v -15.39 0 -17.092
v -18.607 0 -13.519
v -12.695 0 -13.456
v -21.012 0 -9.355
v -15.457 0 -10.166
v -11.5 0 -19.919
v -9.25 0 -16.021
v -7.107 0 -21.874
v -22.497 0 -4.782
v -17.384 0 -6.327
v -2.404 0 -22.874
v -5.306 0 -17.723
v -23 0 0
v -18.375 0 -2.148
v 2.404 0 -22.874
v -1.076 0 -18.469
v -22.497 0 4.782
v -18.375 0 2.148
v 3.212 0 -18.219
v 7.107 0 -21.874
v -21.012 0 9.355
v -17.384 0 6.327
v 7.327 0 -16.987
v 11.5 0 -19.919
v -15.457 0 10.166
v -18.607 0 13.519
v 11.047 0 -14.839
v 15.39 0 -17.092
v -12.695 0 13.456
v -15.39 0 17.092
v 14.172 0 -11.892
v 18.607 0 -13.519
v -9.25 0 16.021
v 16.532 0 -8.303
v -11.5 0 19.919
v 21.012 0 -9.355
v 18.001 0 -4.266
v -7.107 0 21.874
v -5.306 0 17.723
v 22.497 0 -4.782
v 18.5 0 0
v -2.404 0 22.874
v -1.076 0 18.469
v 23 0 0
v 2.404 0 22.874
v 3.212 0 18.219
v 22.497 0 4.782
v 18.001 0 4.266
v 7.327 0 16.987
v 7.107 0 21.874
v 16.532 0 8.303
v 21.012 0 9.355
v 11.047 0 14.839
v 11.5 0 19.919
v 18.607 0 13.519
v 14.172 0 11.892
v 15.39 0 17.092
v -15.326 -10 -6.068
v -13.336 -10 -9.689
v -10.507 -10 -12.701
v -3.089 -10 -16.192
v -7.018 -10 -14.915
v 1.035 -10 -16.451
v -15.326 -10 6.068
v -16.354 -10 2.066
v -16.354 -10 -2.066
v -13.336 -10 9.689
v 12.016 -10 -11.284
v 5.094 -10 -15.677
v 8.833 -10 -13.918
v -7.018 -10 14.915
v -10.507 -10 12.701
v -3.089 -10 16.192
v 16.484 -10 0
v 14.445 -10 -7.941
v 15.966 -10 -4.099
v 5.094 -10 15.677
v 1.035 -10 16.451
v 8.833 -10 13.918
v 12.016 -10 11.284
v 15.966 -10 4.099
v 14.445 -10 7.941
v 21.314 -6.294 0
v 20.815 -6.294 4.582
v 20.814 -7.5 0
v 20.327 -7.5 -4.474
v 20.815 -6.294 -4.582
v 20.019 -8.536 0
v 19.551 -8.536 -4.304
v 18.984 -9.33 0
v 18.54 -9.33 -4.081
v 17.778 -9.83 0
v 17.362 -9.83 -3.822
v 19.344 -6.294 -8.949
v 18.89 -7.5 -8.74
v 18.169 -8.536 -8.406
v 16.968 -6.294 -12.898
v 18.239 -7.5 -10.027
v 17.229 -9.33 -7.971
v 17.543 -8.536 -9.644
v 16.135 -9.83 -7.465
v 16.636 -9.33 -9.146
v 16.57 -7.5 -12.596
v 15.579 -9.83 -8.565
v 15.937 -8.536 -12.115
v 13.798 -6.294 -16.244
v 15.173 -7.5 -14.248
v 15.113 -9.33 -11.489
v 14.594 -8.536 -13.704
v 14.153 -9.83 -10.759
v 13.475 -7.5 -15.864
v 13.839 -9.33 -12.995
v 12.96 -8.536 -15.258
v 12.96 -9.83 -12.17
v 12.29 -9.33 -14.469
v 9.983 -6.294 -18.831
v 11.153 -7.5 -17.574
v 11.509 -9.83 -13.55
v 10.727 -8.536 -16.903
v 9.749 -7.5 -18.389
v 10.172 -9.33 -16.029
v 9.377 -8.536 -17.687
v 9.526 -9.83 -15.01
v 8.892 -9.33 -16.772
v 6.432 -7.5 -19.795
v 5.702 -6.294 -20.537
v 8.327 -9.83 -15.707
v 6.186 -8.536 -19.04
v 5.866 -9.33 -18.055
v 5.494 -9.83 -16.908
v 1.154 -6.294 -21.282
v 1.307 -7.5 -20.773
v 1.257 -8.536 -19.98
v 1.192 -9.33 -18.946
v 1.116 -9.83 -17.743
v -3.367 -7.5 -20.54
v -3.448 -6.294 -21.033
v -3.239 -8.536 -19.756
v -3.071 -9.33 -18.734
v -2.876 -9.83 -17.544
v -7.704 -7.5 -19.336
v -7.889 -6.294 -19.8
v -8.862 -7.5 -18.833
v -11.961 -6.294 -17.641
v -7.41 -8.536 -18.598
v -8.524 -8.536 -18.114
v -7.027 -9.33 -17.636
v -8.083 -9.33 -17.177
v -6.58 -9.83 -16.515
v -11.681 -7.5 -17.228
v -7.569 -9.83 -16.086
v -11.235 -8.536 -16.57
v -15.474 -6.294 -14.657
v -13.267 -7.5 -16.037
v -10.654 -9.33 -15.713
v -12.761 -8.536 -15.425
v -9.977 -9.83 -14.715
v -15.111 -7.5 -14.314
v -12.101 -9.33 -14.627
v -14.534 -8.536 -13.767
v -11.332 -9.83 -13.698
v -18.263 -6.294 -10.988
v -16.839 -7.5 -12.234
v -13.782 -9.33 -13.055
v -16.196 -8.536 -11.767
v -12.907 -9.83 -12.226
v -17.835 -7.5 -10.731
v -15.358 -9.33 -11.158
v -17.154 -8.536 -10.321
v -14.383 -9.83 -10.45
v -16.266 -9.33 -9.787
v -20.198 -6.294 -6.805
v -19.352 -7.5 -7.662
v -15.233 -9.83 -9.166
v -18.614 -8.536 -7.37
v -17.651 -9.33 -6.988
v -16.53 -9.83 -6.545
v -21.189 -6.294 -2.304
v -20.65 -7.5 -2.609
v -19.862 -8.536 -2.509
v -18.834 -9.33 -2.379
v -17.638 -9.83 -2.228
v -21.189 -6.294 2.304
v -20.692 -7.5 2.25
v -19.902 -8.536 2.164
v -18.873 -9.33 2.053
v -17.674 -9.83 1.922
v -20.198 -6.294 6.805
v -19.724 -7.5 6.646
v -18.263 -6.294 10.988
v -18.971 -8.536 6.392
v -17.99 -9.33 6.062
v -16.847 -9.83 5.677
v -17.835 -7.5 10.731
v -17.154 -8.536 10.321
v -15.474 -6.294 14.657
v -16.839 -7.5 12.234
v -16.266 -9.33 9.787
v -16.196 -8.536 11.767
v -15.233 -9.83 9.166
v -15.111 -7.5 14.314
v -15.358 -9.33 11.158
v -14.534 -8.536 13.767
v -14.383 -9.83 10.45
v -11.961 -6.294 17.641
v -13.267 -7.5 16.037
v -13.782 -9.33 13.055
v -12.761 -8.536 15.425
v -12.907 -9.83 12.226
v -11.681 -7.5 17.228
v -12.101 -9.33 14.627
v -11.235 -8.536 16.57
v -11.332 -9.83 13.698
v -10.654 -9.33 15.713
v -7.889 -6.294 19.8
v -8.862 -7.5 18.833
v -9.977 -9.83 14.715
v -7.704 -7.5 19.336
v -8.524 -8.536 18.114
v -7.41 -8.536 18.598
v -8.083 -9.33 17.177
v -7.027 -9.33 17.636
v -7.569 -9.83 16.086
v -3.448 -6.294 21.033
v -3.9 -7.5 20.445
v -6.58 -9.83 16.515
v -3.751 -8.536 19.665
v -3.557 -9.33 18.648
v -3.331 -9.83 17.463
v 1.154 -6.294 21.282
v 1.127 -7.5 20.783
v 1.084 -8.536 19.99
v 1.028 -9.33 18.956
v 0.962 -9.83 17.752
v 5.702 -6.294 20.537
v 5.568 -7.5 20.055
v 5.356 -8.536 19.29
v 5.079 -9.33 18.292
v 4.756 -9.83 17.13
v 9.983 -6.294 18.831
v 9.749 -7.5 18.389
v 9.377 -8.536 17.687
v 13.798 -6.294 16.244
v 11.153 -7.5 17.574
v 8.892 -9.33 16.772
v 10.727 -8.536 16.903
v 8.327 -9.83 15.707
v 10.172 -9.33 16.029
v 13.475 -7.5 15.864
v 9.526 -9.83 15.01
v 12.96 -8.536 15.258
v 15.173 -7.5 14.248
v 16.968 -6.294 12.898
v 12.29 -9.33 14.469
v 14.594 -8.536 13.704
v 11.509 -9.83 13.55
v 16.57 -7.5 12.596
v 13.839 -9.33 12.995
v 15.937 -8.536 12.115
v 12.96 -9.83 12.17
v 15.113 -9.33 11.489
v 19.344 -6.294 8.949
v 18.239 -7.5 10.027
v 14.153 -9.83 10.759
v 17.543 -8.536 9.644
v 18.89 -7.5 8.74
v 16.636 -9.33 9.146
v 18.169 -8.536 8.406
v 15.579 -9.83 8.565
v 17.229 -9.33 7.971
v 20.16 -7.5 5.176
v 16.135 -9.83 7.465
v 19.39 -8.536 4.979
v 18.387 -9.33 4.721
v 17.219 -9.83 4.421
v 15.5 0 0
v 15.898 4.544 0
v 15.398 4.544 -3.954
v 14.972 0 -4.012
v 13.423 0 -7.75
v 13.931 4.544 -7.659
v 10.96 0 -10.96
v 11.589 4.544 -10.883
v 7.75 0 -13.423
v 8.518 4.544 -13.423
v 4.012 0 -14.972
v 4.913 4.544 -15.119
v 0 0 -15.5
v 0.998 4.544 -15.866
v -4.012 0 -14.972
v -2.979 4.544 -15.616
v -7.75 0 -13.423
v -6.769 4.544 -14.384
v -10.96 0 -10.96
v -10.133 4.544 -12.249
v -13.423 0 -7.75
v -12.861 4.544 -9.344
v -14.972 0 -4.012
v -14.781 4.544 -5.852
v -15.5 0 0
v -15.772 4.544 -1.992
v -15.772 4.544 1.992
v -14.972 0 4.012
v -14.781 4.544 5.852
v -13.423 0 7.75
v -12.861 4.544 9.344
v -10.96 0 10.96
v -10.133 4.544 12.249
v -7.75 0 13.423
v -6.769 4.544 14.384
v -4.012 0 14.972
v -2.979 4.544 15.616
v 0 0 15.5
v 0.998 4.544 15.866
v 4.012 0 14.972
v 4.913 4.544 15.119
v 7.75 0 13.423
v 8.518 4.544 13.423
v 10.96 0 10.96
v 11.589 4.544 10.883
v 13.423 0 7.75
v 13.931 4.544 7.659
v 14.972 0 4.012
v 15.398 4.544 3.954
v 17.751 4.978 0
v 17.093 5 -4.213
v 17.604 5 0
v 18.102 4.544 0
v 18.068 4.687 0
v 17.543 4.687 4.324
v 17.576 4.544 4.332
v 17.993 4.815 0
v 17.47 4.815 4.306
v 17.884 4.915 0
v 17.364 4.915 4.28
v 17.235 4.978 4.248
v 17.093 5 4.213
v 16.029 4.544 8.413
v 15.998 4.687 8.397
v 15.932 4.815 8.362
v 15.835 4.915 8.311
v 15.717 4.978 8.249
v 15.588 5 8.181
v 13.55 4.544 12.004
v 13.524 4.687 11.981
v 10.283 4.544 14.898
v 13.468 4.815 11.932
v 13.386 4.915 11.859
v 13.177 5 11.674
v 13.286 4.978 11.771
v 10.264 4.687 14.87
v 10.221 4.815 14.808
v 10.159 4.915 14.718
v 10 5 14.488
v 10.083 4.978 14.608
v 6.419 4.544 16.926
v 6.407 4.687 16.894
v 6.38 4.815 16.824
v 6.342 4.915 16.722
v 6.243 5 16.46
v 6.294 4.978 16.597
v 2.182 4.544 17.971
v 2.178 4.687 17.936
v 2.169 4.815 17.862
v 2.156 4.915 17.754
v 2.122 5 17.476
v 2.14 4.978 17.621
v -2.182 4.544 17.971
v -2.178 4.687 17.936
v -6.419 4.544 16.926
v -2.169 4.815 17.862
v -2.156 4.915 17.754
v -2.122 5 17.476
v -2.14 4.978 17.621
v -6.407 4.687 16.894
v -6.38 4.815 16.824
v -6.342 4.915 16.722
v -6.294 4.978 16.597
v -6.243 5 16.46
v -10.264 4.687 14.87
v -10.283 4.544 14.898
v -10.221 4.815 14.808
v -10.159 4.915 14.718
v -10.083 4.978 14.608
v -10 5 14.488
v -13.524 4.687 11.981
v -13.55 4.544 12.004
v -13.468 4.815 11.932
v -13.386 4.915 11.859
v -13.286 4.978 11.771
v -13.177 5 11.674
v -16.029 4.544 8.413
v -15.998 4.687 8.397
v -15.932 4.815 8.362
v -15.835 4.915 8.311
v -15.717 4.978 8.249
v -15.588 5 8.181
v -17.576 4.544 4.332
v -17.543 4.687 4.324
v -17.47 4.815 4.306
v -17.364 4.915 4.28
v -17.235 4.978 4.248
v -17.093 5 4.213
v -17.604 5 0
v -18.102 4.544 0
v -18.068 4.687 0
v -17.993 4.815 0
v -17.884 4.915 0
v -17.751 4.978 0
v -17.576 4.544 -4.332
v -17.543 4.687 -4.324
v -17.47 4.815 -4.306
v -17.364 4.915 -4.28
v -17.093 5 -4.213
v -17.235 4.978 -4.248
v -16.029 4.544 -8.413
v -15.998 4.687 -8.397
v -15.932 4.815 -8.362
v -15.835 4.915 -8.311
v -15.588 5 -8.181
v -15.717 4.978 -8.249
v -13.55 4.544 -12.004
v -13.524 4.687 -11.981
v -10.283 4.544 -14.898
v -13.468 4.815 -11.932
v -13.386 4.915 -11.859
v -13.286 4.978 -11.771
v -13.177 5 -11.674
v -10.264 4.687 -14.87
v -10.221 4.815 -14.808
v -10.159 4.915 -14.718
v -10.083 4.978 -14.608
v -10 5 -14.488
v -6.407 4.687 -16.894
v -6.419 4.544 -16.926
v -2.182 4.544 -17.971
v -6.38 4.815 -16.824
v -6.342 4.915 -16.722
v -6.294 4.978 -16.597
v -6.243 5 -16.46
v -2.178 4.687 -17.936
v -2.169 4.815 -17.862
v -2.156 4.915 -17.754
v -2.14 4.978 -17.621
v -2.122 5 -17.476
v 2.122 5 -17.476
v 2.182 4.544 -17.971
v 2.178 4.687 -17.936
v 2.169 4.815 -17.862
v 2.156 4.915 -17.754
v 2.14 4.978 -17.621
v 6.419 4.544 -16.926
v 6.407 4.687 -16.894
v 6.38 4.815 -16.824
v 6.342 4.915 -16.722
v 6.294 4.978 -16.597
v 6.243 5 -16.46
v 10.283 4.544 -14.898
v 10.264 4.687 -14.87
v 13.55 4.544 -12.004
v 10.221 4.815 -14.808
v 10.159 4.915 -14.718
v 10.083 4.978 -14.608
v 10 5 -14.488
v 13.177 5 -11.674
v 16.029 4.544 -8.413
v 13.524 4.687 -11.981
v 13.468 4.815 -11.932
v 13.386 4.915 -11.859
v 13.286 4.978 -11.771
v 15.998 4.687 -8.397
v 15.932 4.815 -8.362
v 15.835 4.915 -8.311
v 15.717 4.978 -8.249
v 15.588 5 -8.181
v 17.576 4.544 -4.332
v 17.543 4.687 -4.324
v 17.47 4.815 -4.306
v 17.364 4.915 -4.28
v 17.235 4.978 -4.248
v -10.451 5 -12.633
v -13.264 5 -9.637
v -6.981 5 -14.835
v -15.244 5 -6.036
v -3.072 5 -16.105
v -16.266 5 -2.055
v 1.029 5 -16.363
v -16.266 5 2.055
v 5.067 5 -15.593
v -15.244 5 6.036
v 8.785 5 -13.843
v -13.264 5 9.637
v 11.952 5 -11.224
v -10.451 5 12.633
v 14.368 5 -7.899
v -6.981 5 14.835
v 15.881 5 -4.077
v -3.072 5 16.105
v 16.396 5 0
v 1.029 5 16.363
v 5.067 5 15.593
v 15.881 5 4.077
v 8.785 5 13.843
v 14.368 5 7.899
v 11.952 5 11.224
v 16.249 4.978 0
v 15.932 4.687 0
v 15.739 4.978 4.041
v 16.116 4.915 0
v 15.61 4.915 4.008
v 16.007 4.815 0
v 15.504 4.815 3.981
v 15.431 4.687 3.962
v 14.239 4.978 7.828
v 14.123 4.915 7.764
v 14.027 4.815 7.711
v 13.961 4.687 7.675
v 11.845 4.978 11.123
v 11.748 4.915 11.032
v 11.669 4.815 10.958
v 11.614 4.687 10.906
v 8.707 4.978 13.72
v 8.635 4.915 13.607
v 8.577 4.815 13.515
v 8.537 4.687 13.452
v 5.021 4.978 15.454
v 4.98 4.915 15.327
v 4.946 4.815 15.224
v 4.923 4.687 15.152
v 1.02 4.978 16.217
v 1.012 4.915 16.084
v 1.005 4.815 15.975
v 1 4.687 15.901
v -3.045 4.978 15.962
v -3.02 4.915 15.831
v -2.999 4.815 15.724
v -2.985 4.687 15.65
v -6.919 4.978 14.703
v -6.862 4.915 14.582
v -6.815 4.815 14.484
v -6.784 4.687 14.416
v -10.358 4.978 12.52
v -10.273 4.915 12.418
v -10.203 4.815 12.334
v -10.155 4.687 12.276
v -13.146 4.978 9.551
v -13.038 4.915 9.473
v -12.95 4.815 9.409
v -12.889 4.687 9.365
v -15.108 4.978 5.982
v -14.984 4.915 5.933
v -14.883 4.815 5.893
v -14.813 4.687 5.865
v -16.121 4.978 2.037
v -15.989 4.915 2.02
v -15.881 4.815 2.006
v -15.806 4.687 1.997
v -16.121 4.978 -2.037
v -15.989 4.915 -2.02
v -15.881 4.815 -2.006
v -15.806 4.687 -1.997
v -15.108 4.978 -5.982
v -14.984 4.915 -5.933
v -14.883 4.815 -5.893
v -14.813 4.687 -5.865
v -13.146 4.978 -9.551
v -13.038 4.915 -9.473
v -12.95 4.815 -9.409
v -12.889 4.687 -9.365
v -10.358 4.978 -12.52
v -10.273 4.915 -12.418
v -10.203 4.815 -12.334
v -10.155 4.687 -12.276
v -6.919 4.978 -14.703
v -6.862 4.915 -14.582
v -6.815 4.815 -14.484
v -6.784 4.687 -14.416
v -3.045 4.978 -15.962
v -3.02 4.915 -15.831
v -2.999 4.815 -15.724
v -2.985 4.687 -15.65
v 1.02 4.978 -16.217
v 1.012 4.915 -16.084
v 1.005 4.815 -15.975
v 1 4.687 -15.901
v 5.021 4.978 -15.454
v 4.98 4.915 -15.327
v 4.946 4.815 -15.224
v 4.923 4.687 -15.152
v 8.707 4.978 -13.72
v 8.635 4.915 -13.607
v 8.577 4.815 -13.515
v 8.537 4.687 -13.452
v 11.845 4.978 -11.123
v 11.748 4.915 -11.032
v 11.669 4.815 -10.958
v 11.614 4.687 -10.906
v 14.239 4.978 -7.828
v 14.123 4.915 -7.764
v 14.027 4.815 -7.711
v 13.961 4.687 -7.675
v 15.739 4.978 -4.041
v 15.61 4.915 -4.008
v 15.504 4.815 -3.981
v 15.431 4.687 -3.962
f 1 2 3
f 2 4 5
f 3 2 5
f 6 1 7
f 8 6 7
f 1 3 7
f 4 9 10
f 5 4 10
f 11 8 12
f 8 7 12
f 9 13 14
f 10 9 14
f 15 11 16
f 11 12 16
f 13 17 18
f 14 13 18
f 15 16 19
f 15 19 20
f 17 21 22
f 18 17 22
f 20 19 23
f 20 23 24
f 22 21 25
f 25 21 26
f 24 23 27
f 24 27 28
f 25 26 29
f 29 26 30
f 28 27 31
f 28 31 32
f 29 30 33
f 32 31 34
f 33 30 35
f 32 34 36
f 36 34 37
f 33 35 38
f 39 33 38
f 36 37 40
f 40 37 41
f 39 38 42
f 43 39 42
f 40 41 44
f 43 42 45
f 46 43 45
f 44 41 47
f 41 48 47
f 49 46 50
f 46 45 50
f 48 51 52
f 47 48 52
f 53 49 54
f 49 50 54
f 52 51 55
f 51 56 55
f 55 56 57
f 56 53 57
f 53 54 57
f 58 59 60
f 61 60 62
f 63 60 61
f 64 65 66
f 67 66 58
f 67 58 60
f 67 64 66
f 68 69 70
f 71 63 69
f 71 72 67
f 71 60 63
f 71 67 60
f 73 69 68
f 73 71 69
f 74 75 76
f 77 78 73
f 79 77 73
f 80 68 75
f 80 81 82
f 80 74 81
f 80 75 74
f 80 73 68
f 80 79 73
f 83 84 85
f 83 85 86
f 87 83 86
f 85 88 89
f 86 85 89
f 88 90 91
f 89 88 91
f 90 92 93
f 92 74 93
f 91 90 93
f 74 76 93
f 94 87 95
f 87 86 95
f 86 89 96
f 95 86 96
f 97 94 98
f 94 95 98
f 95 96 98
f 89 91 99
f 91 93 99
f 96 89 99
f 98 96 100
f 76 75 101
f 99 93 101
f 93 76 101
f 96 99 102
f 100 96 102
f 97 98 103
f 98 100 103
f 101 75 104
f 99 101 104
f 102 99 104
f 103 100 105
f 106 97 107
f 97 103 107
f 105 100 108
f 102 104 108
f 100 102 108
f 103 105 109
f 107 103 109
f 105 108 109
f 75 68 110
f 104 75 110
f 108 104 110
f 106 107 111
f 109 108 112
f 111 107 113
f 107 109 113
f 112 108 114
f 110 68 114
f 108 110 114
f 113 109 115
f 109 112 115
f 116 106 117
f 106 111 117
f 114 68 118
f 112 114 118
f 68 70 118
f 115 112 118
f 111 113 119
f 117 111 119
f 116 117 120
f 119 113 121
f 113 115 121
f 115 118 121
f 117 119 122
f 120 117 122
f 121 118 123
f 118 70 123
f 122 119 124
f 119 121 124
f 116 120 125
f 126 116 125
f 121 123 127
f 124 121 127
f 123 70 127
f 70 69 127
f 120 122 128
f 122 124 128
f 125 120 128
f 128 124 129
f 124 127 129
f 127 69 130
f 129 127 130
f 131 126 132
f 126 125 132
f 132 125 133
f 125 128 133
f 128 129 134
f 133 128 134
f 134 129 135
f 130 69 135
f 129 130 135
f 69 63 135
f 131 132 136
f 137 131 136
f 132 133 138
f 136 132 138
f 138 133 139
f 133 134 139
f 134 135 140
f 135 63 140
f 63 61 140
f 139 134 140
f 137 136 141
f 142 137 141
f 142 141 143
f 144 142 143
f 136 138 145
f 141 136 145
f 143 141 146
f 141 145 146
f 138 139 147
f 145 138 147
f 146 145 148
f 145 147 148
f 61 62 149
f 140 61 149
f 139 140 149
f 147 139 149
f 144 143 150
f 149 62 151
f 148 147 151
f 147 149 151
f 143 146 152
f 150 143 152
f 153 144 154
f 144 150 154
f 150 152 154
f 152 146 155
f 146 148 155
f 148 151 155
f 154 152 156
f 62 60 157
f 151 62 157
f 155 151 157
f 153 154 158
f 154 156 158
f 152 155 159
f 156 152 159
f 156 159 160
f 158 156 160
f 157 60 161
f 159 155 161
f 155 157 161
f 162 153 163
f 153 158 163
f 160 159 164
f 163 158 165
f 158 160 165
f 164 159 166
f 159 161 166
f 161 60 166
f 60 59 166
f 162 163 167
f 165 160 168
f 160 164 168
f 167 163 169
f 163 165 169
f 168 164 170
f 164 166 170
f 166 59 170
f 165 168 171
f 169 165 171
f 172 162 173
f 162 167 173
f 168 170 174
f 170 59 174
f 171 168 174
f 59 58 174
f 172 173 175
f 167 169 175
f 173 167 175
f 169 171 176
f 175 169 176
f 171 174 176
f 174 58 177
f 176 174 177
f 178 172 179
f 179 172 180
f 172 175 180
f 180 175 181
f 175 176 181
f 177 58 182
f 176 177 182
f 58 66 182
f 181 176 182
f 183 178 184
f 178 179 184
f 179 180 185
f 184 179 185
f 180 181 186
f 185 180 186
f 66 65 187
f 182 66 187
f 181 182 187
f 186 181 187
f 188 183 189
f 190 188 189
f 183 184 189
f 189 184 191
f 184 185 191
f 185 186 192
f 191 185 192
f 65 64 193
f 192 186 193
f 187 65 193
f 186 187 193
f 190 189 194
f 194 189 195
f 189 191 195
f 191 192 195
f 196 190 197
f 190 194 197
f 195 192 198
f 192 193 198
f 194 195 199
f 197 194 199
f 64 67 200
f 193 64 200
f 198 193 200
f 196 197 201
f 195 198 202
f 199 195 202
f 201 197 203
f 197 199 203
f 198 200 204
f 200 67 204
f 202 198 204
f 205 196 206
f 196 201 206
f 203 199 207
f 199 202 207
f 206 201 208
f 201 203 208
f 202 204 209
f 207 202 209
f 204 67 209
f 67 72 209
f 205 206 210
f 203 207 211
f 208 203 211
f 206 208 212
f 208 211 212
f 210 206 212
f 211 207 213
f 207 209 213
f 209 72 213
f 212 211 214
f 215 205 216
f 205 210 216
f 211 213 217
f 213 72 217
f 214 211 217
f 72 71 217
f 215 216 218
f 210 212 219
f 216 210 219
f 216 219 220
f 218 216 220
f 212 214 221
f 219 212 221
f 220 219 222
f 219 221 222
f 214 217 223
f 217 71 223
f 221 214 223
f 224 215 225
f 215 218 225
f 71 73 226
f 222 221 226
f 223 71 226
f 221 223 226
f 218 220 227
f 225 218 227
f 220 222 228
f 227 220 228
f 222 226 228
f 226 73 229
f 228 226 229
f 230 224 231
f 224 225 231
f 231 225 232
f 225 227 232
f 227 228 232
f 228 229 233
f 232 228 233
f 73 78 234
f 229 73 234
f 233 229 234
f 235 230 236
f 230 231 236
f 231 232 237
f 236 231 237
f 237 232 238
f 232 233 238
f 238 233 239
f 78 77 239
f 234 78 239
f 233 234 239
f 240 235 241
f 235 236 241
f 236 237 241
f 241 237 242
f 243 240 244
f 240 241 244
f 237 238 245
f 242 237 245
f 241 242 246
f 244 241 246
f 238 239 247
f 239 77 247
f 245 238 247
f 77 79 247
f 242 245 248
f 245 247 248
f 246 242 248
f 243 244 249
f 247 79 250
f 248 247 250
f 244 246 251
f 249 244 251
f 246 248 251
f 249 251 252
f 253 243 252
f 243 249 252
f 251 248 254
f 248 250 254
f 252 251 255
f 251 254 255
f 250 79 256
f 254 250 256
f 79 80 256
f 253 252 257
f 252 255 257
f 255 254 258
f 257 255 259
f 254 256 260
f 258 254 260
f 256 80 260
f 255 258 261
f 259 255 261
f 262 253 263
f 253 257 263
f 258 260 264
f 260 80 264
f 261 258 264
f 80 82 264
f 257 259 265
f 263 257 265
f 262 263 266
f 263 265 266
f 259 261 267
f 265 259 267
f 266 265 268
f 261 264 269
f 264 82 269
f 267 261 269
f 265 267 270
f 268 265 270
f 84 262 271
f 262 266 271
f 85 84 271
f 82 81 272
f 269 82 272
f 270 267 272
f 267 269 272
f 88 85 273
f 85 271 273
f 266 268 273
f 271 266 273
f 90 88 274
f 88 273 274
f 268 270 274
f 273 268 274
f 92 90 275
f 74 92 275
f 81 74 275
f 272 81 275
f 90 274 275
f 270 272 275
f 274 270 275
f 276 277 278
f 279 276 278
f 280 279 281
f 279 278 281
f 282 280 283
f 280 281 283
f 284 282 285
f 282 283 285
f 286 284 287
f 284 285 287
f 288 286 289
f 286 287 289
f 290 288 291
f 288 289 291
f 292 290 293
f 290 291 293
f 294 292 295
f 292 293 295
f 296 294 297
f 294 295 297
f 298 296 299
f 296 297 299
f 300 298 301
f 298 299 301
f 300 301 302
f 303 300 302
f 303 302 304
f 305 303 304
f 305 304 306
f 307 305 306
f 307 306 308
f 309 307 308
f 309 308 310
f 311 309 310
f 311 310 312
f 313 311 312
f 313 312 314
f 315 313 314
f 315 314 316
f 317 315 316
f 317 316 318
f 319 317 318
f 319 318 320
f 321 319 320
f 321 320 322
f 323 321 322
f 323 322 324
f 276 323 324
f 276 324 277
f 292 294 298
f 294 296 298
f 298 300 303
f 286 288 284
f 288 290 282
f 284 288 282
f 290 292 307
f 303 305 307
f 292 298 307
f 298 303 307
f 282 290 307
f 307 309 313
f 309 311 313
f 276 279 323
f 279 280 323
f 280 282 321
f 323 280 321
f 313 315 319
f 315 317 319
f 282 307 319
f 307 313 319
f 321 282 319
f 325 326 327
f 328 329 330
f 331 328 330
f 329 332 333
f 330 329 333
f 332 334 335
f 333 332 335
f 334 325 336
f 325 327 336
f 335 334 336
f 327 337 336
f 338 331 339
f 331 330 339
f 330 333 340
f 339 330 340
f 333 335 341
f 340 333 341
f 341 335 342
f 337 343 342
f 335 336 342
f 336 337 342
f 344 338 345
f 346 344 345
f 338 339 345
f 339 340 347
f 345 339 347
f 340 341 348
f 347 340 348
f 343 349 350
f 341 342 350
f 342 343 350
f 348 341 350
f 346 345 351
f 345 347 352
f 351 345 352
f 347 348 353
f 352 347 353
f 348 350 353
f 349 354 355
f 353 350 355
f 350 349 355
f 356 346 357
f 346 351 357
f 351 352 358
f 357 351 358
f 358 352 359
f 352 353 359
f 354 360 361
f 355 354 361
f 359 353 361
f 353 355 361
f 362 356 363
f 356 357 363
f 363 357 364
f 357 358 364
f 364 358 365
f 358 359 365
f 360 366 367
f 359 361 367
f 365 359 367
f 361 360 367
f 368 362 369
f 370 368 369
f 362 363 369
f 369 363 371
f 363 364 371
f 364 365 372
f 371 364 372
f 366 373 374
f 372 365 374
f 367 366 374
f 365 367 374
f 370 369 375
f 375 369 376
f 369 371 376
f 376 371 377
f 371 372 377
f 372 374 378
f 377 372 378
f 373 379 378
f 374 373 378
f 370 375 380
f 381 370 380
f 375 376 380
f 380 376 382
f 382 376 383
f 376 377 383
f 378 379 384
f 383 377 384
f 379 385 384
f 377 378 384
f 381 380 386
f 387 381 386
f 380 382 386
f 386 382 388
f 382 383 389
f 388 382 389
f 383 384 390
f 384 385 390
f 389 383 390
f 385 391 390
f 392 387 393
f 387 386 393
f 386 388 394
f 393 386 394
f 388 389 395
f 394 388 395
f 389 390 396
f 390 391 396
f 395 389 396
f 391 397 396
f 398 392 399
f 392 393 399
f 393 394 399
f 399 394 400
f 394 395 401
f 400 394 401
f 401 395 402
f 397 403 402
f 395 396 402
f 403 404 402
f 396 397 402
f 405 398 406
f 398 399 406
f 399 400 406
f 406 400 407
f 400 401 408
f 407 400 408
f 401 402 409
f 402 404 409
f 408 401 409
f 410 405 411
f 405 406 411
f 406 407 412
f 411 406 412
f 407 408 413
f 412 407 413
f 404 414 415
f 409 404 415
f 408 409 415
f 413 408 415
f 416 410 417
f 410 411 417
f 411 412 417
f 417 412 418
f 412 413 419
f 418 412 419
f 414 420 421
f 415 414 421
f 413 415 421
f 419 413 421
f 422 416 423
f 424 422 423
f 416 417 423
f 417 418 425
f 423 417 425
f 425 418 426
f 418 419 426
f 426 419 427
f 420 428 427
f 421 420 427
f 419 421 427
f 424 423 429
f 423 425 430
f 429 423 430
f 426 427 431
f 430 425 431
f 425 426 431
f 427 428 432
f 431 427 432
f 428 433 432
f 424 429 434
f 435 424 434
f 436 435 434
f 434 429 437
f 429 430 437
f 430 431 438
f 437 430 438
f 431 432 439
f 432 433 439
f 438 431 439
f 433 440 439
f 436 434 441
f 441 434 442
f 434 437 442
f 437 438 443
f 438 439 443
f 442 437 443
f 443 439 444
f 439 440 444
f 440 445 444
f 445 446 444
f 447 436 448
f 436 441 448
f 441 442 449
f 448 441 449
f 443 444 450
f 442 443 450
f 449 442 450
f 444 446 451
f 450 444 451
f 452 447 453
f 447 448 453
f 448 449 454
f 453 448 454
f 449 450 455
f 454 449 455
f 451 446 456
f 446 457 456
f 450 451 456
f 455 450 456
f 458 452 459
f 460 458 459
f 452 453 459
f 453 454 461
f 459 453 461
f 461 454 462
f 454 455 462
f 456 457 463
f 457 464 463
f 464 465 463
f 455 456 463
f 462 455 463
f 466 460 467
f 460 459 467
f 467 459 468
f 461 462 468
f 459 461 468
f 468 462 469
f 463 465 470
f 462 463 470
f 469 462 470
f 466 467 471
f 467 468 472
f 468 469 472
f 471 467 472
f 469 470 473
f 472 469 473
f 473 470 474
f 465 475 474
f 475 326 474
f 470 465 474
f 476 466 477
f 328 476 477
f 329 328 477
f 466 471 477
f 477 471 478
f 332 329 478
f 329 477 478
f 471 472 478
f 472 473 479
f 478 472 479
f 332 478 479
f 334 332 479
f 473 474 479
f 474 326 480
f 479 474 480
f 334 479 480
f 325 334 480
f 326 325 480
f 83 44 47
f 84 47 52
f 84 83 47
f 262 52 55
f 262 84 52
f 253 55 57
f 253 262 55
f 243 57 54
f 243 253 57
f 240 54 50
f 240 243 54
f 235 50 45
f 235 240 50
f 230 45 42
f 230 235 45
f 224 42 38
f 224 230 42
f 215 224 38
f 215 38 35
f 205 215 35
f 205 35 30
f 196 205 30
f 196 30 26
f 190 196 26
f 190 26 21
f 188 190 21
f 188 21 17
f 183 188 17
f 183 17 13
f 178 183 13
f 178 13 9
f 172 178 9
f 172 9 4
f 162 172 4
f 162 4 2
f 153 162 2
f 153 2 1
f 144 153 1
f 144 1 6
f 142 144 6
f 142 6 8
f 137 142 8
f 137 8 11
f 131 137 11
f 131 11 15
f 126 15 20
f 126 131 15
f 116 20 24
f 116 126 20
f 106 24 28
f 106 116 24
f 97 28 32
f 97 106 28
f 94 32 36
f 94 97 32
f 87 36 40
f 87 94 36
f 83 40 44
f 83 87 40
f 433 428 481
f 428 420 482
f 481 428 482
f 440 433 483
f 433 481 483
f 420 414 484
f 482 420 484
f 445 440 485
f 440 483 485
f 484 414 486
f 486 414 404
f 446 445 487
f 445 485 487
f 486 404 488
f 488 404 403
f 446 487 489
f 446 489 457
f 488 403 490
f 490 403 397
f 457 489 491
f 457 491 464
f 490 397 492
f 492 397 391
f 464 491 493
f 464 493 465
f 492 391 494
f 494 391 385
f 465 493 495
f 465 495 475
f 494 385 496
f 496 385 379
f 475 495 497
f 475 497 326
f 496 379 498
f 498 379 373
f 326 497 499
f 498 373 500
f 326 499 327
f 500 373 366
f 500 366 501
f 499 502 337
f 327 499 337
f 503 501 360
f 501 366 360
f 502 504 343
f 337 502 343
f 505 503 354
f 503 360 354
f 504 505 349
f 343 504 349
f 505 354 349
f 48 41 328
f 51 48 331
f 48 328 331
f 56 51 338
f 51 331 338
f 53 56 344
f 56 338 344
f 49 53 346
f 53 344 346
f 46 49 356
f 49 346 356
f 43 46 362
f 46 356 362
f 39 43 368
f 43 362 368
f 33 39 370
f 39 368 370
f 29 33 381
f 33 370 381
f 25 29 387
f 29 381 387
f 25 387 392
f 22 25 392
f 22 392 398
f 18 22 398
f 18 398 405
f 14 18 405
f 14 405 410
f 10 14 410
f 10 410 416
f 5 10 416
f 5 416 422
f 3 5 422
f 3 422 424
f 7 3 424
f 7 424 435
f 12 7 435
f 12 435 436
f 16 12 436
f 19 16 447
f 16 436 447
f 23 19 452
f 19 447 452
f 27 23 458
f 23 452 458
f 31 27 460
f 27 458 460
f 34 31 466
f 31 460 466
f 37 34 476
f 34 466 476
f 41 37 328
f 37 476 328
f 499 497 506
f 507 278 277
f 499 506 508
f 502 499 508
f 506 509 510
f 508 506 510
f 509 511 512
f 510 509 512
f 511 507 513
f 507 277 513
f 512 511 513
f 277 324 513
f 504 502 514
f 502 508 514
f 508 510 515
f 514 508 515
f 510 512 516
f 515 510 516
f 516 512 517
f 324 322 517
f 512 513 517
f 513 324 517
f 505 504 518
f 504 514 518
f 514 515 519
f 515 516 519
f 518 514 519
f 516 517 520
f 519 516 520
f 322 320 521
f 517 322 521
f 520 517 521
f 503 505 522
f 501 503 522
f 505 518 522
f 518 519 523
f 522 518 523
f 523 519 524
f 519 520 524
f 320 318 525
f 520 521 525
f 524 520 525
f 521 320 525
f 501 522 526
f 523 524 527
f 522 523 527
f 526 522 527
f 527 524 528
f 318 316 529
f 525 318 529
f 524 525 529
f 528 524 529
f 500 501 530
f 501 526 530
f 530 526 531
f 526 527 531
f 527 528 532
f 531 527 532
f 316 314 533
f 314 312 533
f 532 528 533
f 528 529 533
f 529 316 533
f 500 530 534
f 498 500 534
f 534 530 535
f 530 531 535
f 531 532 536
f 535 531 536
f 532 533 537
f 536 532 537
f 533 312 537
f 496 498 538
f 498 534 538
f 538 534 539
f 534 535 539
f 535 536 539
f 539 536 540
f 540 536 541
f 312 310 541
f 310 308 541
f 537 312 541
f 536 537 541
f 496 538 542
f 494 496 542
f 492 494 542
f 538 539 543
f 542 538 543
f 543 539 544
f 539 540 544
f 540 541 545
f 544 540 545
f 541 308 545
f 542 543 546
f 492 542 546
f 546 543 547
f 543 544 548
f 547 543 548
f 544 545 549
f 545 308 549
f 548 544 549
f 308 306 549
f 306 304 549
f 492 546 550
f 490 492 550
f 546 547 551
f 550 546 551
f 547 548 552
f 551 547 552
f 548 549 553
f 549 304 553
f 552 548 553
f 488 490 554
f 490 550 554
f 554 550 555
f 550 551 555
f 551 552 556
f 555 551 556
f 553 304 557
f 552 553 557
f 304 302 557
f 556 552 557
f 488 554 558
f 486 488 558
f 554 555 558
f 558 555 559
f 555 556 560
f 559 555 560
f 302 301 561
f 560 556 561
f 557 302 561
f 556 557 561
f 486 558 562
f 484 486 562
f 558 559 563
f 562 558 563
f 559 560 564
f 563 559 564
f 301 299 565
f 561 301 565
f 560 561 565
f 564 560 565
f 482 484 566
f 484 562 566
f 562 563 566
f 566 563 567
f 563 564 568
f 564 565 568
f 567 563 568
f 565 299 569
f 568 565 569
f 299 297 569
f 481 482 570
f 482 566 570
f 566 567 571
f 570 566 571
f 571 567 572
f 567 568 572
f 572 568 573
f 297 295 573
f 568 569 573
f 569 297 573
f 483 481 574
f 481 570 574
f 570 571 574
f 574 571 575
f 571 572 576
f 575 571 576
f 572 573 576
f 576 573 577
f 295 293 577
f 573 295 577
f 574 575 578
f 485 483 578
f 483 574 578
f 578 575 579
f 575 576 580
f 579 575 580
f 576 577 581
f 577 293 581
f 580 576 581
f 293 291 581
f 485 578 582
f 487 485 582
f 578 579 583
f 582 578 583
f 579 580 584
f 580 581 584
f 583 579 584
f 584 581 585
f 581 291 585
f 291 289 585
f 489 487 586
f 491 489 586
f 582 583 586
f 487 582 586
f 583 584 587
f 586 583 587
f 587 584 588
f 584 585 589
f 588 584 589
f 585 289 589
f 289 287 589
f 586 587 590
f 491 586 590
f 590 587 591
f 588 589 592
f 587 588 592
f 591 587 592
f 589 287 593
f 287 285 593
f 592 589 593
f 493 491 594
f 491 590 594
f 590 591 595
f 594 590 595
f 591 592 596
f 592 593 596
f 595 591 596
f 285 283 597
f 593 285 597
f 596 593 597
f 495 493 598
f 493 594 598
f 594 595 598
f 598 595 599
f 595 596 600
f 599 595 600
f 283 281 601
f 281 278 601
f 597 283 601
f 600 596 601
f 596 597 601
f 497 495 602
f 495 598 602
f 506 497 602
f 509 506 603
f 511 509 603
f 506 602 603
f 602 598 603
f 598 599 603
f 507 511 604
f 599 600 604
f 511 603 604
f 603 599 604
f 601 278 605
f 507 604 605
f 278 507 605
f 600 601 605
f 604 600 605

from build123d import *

# Parameters (mm, degrees)
F0_R     = 18.5
F0_R_2   = 15.5
F1_DEPTH = 5
F1_TAPER = 5
F0_R_3   = 23
F2_DEPTH = 10
F2_TAPER = 15
F3_R     = 5
F4_R     = 0.5


with BuildPart() as f1:
    # F0 (on Front) → F1 (new body)
    with BuildSketch(Plane.XZ):
        Circle(F0_R)
        Circle(F0_R_2, mode=Mode.SUBTRACT)
    extrude(amount=-F1_DEPTH, taper=F1_TAPER)

    # F0 (on Front) → F2 (join)
    with BuildSketch(Plane.XZ):
        Circle(F0_R_3)
        Circle(F0_R, mode=Mode.SUBTRACT)
        Circle(F0_R)
        Circle(F0_R_2, mode=Mode.SUBTRACT)
        Circle(F0_R_2)
    extrude(amount=F2_DEPTH, taper=F2_TAPER)

    # F3
    f3_edges = [f1.edges().sort_by_distance(p)[0] for p in [
        (-20.320508, -10, 0),
    ]]
    fillet(f3_edges, radius=F3_R)

    # F4
    f4_edges = [f1.edges().sort_by_distance(p)[0] for p in [
        (-18.062557, 5, 0),
        (-15.937443, 5, 0),
    ]]
    fillet(f4_edges, radius=F4_R)


solid = f1.part
